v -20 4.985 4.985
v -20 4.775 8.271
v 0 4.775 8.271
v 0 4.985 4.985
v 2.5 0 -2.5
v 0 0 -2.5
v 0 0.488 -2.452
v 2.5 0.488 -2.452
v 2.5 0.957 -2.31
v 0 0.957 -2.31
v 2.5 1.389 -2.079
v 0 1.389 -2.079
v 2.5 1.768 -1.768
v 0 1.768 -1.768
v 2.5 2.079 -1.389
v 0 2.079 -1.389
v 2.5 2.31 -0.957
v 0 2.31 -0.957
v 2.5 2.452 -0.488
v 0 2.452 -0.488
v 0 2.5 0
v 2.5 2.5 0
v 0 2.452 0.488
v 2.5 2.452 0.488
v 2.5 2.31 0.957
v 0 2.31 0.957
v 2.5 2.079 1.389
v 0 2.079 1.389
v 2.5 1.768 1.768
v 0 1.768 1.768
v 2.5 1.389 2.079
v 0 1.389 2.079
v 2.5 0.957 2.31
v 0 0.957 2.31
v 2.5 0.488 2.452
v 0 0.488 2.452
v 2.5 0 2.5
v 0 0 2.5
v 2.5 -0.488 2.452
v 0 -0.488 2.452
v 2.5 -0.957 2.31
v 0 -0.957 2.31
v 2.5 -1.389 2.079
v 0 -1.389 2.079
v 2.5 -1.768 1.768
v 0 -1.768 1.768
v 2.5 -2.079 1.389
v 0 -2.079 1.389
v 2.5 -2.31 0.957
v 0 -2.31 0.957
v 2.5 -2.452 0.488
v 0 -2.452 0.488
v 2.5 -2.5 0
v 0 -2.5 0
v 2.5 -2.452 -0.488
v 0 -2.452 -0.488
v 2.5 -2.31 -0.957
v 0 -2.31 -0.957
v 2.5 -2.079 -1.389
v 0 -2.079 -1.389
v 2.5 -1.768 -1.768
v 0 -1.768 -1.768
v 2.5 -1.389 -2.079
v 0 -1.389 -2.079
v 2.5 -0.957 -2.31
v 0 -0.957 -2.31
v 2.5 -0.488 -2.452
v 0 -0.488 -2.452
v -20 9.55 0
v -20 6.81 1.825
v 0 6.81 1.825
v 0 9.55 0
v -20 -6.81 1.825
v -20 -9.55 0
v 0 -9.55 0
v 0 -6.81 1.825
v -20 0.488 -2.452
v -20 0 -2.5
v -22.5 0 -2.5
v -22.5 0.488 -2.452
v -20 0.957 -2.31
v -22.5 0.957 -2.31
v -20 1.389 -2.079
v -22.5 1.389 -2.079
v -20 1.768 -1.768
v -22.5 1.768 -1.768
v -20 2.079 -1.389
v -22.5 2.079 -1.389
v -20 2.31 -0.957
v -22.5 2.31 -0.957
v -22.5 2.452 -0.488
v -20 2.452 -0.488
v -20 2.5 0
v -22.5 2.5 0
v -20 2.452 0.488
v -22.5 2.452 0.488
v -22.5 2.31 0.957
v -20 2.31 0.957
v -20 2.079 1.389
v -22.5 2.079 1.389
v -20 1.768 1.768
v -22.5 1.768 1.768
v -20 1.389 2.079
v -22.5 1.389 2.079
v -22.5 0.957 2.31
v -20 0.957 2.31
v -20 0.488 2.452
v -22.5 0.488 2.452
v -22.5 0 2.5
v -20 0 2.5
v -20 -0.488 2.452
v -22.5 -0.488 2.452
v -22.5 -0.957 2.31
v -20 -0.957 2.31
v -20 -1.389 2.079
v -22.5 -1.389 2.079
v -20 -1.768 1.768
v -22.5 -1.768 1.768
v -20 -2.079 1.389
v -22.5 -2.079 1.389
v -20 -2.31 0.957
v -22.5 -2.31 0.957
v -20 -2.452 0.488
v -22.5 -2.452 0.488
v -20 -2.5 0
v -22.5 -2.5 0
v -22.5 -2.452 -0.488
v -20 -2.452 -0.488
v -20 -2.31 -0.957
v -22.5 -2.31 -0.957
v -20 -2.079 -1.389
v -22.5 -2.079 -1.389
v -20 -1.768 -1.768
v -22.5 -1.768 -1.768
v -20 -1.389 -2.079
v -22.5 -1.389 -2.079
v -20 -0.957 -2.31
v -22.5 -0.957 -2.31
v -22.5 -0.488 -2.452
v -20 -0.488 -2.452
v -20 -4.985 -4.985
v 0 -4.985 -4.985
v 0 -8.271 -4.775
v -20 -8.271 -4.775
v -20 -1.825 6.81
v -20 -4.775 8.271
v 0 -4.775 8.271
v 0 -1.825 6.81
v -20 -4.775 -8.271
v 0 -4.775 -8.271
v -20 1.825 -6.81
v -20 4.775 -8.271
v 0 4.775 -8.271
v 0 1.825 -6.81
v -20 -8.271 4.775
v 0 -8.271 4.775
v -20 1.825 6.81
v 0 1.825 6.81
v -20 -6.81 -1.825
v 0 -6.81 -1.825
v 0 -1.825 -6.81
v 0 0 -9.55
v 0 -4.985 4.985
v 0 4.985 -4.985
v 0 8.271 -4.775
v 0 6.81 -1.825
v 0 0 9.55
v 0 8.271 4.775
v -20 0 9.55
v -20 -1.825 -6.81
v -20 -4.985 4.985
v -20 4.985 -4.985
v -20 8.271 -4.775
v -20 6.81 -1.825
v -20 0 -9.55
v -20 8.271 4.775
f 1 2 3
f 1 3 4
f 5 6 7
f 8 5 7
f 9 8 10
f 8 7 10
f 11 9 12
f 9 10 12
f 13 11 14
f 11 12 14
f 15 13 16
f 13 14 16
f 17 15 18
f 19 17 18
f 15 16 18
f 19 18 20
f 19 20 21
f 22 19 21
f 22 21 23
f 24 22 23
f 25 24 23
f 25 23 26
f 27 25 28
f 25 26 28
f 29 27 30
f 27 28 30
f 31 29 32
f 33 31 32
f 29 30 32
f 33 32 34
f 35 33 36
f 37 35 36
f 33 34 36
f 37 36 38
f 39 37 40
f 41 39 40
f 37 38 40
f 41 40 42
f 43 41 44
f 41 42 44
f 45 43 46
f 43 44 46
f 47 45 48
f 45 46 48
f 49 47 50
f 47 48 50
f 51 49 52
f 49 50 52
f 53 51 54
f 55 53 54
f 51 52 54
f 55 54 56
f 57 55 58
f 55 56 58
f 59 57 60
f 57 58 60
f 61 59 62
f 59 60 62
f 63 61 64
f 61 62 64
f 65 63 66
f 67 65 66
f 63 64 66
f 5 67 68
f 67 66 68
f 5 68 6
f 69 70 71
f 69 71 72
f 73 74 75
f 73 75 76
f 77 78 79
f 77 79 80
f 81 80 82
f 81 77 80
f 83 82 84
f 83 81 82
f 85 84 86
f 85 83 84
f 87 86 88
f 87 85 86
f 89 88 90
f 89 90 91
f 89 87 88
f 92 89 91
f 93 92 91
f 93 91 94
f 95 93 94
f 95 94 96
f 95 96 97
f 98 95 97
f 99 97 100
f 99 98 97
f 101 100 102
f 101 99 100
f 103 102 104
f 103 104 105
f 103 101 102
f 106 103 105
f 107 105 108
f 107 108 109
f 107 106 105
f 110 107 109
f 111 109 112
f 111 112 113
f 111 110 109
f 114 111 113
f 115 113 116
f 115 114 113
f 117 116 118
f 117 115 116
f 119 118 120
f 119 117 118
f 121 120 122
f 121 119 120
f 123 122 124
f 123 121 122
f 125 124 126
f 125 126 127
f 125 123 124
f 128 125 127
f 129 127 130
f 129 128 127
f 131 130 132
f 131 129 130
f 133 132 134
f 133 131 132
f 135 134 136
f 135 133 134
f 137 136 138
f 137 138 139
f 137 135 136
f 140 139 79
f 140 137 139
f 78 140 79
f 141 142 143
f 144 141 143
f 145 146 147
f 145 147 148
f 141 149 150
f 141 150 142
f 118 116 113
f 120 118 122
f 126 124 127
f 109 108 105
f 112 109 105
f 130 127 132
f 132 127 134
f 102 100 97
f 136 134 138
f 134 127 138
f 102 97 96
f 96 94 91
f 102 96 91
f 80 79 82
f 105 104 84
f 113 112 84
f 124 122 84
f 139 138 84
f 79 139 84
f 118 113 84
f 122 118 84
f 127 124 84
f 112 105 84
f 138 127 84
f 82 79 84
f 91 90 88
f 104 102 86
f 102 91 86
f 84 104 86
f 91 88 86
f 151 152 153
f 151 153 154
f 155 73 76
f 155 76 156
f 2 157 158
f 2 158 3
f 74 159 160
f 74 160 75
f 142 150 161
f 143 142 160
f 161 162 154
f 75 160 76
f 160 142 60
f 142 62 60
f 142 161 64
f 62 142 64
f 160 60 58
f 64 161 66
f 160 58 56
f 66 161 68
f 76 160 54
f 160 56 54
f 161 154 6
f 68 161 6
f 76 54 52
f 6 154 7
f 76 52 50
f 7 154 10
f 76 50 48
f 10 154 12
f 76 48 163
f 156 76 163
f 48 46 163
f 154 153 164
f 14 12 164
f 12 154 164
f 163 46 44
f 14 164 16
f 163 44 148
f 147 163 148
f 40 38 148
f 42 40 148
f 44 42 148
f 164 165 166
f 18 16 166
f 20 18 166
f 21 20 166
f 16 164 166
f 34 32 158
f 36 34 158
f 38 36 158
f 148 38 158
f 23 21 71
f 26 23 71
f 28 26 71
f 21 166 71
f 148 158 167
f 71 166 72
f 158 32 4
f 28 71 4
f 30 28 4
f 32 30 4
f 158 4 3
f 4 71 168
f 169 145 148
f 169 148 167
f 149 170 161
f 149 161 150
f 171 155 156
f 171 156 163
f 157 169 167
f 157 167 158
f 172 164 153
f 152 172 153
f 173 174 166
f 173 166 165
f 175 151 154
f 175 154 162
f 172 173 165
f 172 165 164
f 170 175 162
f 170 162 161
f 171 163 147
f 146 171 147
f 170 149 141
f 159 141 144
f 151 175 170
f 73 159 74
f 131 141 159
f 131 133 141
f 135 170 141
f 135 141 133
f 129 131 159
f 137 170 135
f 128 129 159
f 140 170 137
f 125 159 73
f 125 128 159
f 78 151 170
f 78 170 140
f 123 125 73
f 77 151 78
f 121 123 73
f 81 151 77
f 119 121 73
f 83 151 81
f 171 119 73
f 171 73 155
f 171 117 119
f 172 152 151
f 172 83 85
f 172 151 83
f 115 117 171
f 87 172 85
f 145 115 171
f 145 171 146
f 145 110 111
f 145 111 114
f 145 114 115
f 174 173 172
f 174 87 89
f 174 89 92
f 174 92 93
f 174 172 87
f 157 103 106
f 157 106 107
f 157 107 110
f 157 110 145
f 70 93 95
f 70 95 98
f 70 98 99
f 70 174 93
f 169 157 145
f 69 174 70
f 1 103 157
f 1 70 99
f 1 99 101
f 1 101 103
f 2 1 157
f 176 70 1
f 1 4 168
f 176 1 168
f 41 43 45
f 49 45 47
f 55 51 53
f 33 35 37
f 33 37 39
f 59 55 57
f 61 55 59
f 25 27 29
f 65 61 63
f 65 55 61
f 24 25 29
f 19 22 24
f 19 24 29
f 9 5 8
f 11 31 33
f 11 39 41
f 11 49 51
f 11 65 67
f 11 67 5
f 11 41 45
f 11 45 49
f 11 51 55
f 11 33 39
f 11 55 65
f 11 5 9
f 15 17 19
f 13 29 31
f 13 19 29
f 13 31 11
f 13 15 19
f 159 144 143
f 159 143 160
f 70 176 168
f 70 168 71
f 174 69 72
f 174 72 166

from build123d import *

# Parameters (mm, degrees)
BOSS_EXTRUDE1_DEPTH = 10
SKETCH4_R           = 2.5
BOSS_EXTRUDE3_DEPTH = 2.5


with BuildPart() as part:
    # Sketch1 → Boss-Extrude1 (new body)
    with BuildSketch(Plane(origin=(0, 0, 0), x_dir=(0, 0, -1), z_dir=(1, 0, 0))):
        Polygon((0, 9.55), (1.824674268, 6.809777075), (4.775, 8.270542606), (4.985102807, 4.985102807), (8.270542606, 4.775), (6.809777075, 1.824674268), (9.55, 0), (6.809777075, -1.824674268), (8.270542606, -4.775), (4.985102807, -4.985102807), (4.775, -8.270542606), (1.824674268, -6.809777075), (0, -9.55), (-1.824674268, -6.809777075), (-4.775, -8.270542606), (-4.985102807, -4.985102807), (-8.270542606, -4.775), (-6.809777075, -1.824674268), (-9.55, 0), (-6.809777075, 1.824674268), (-8.270542606, 4.775), (-4.985102807, 4.985102807), (-4.775, 8.270542606), (-1.824674268, 6.809777075), align=None)
    boss_extrude1 = extrude(amount=-BOSS_EXTRUDE1_DEPTH)

    # Sketch4 → Boss-Extrude3 (add)
    with BuildSketch(Plane(origin=(0, 0, 0), x_dir=(0, 0, -1), z_dir=(1, 0, 0))):
        Circle(SKETCH4_R)
    boss_extrude3 = extrude(amount=BOSS_EXTRUDE3_DEPTH)

    # Mirror1: Boss-Extrude1, Boss-Extrude3 across plane
    add(boss_extrude1.mirror(Plane.ZY.offset(10)))
    add(boss_extrude3.mirror(Plane.ZY.offset(10)))


solid = part.part
